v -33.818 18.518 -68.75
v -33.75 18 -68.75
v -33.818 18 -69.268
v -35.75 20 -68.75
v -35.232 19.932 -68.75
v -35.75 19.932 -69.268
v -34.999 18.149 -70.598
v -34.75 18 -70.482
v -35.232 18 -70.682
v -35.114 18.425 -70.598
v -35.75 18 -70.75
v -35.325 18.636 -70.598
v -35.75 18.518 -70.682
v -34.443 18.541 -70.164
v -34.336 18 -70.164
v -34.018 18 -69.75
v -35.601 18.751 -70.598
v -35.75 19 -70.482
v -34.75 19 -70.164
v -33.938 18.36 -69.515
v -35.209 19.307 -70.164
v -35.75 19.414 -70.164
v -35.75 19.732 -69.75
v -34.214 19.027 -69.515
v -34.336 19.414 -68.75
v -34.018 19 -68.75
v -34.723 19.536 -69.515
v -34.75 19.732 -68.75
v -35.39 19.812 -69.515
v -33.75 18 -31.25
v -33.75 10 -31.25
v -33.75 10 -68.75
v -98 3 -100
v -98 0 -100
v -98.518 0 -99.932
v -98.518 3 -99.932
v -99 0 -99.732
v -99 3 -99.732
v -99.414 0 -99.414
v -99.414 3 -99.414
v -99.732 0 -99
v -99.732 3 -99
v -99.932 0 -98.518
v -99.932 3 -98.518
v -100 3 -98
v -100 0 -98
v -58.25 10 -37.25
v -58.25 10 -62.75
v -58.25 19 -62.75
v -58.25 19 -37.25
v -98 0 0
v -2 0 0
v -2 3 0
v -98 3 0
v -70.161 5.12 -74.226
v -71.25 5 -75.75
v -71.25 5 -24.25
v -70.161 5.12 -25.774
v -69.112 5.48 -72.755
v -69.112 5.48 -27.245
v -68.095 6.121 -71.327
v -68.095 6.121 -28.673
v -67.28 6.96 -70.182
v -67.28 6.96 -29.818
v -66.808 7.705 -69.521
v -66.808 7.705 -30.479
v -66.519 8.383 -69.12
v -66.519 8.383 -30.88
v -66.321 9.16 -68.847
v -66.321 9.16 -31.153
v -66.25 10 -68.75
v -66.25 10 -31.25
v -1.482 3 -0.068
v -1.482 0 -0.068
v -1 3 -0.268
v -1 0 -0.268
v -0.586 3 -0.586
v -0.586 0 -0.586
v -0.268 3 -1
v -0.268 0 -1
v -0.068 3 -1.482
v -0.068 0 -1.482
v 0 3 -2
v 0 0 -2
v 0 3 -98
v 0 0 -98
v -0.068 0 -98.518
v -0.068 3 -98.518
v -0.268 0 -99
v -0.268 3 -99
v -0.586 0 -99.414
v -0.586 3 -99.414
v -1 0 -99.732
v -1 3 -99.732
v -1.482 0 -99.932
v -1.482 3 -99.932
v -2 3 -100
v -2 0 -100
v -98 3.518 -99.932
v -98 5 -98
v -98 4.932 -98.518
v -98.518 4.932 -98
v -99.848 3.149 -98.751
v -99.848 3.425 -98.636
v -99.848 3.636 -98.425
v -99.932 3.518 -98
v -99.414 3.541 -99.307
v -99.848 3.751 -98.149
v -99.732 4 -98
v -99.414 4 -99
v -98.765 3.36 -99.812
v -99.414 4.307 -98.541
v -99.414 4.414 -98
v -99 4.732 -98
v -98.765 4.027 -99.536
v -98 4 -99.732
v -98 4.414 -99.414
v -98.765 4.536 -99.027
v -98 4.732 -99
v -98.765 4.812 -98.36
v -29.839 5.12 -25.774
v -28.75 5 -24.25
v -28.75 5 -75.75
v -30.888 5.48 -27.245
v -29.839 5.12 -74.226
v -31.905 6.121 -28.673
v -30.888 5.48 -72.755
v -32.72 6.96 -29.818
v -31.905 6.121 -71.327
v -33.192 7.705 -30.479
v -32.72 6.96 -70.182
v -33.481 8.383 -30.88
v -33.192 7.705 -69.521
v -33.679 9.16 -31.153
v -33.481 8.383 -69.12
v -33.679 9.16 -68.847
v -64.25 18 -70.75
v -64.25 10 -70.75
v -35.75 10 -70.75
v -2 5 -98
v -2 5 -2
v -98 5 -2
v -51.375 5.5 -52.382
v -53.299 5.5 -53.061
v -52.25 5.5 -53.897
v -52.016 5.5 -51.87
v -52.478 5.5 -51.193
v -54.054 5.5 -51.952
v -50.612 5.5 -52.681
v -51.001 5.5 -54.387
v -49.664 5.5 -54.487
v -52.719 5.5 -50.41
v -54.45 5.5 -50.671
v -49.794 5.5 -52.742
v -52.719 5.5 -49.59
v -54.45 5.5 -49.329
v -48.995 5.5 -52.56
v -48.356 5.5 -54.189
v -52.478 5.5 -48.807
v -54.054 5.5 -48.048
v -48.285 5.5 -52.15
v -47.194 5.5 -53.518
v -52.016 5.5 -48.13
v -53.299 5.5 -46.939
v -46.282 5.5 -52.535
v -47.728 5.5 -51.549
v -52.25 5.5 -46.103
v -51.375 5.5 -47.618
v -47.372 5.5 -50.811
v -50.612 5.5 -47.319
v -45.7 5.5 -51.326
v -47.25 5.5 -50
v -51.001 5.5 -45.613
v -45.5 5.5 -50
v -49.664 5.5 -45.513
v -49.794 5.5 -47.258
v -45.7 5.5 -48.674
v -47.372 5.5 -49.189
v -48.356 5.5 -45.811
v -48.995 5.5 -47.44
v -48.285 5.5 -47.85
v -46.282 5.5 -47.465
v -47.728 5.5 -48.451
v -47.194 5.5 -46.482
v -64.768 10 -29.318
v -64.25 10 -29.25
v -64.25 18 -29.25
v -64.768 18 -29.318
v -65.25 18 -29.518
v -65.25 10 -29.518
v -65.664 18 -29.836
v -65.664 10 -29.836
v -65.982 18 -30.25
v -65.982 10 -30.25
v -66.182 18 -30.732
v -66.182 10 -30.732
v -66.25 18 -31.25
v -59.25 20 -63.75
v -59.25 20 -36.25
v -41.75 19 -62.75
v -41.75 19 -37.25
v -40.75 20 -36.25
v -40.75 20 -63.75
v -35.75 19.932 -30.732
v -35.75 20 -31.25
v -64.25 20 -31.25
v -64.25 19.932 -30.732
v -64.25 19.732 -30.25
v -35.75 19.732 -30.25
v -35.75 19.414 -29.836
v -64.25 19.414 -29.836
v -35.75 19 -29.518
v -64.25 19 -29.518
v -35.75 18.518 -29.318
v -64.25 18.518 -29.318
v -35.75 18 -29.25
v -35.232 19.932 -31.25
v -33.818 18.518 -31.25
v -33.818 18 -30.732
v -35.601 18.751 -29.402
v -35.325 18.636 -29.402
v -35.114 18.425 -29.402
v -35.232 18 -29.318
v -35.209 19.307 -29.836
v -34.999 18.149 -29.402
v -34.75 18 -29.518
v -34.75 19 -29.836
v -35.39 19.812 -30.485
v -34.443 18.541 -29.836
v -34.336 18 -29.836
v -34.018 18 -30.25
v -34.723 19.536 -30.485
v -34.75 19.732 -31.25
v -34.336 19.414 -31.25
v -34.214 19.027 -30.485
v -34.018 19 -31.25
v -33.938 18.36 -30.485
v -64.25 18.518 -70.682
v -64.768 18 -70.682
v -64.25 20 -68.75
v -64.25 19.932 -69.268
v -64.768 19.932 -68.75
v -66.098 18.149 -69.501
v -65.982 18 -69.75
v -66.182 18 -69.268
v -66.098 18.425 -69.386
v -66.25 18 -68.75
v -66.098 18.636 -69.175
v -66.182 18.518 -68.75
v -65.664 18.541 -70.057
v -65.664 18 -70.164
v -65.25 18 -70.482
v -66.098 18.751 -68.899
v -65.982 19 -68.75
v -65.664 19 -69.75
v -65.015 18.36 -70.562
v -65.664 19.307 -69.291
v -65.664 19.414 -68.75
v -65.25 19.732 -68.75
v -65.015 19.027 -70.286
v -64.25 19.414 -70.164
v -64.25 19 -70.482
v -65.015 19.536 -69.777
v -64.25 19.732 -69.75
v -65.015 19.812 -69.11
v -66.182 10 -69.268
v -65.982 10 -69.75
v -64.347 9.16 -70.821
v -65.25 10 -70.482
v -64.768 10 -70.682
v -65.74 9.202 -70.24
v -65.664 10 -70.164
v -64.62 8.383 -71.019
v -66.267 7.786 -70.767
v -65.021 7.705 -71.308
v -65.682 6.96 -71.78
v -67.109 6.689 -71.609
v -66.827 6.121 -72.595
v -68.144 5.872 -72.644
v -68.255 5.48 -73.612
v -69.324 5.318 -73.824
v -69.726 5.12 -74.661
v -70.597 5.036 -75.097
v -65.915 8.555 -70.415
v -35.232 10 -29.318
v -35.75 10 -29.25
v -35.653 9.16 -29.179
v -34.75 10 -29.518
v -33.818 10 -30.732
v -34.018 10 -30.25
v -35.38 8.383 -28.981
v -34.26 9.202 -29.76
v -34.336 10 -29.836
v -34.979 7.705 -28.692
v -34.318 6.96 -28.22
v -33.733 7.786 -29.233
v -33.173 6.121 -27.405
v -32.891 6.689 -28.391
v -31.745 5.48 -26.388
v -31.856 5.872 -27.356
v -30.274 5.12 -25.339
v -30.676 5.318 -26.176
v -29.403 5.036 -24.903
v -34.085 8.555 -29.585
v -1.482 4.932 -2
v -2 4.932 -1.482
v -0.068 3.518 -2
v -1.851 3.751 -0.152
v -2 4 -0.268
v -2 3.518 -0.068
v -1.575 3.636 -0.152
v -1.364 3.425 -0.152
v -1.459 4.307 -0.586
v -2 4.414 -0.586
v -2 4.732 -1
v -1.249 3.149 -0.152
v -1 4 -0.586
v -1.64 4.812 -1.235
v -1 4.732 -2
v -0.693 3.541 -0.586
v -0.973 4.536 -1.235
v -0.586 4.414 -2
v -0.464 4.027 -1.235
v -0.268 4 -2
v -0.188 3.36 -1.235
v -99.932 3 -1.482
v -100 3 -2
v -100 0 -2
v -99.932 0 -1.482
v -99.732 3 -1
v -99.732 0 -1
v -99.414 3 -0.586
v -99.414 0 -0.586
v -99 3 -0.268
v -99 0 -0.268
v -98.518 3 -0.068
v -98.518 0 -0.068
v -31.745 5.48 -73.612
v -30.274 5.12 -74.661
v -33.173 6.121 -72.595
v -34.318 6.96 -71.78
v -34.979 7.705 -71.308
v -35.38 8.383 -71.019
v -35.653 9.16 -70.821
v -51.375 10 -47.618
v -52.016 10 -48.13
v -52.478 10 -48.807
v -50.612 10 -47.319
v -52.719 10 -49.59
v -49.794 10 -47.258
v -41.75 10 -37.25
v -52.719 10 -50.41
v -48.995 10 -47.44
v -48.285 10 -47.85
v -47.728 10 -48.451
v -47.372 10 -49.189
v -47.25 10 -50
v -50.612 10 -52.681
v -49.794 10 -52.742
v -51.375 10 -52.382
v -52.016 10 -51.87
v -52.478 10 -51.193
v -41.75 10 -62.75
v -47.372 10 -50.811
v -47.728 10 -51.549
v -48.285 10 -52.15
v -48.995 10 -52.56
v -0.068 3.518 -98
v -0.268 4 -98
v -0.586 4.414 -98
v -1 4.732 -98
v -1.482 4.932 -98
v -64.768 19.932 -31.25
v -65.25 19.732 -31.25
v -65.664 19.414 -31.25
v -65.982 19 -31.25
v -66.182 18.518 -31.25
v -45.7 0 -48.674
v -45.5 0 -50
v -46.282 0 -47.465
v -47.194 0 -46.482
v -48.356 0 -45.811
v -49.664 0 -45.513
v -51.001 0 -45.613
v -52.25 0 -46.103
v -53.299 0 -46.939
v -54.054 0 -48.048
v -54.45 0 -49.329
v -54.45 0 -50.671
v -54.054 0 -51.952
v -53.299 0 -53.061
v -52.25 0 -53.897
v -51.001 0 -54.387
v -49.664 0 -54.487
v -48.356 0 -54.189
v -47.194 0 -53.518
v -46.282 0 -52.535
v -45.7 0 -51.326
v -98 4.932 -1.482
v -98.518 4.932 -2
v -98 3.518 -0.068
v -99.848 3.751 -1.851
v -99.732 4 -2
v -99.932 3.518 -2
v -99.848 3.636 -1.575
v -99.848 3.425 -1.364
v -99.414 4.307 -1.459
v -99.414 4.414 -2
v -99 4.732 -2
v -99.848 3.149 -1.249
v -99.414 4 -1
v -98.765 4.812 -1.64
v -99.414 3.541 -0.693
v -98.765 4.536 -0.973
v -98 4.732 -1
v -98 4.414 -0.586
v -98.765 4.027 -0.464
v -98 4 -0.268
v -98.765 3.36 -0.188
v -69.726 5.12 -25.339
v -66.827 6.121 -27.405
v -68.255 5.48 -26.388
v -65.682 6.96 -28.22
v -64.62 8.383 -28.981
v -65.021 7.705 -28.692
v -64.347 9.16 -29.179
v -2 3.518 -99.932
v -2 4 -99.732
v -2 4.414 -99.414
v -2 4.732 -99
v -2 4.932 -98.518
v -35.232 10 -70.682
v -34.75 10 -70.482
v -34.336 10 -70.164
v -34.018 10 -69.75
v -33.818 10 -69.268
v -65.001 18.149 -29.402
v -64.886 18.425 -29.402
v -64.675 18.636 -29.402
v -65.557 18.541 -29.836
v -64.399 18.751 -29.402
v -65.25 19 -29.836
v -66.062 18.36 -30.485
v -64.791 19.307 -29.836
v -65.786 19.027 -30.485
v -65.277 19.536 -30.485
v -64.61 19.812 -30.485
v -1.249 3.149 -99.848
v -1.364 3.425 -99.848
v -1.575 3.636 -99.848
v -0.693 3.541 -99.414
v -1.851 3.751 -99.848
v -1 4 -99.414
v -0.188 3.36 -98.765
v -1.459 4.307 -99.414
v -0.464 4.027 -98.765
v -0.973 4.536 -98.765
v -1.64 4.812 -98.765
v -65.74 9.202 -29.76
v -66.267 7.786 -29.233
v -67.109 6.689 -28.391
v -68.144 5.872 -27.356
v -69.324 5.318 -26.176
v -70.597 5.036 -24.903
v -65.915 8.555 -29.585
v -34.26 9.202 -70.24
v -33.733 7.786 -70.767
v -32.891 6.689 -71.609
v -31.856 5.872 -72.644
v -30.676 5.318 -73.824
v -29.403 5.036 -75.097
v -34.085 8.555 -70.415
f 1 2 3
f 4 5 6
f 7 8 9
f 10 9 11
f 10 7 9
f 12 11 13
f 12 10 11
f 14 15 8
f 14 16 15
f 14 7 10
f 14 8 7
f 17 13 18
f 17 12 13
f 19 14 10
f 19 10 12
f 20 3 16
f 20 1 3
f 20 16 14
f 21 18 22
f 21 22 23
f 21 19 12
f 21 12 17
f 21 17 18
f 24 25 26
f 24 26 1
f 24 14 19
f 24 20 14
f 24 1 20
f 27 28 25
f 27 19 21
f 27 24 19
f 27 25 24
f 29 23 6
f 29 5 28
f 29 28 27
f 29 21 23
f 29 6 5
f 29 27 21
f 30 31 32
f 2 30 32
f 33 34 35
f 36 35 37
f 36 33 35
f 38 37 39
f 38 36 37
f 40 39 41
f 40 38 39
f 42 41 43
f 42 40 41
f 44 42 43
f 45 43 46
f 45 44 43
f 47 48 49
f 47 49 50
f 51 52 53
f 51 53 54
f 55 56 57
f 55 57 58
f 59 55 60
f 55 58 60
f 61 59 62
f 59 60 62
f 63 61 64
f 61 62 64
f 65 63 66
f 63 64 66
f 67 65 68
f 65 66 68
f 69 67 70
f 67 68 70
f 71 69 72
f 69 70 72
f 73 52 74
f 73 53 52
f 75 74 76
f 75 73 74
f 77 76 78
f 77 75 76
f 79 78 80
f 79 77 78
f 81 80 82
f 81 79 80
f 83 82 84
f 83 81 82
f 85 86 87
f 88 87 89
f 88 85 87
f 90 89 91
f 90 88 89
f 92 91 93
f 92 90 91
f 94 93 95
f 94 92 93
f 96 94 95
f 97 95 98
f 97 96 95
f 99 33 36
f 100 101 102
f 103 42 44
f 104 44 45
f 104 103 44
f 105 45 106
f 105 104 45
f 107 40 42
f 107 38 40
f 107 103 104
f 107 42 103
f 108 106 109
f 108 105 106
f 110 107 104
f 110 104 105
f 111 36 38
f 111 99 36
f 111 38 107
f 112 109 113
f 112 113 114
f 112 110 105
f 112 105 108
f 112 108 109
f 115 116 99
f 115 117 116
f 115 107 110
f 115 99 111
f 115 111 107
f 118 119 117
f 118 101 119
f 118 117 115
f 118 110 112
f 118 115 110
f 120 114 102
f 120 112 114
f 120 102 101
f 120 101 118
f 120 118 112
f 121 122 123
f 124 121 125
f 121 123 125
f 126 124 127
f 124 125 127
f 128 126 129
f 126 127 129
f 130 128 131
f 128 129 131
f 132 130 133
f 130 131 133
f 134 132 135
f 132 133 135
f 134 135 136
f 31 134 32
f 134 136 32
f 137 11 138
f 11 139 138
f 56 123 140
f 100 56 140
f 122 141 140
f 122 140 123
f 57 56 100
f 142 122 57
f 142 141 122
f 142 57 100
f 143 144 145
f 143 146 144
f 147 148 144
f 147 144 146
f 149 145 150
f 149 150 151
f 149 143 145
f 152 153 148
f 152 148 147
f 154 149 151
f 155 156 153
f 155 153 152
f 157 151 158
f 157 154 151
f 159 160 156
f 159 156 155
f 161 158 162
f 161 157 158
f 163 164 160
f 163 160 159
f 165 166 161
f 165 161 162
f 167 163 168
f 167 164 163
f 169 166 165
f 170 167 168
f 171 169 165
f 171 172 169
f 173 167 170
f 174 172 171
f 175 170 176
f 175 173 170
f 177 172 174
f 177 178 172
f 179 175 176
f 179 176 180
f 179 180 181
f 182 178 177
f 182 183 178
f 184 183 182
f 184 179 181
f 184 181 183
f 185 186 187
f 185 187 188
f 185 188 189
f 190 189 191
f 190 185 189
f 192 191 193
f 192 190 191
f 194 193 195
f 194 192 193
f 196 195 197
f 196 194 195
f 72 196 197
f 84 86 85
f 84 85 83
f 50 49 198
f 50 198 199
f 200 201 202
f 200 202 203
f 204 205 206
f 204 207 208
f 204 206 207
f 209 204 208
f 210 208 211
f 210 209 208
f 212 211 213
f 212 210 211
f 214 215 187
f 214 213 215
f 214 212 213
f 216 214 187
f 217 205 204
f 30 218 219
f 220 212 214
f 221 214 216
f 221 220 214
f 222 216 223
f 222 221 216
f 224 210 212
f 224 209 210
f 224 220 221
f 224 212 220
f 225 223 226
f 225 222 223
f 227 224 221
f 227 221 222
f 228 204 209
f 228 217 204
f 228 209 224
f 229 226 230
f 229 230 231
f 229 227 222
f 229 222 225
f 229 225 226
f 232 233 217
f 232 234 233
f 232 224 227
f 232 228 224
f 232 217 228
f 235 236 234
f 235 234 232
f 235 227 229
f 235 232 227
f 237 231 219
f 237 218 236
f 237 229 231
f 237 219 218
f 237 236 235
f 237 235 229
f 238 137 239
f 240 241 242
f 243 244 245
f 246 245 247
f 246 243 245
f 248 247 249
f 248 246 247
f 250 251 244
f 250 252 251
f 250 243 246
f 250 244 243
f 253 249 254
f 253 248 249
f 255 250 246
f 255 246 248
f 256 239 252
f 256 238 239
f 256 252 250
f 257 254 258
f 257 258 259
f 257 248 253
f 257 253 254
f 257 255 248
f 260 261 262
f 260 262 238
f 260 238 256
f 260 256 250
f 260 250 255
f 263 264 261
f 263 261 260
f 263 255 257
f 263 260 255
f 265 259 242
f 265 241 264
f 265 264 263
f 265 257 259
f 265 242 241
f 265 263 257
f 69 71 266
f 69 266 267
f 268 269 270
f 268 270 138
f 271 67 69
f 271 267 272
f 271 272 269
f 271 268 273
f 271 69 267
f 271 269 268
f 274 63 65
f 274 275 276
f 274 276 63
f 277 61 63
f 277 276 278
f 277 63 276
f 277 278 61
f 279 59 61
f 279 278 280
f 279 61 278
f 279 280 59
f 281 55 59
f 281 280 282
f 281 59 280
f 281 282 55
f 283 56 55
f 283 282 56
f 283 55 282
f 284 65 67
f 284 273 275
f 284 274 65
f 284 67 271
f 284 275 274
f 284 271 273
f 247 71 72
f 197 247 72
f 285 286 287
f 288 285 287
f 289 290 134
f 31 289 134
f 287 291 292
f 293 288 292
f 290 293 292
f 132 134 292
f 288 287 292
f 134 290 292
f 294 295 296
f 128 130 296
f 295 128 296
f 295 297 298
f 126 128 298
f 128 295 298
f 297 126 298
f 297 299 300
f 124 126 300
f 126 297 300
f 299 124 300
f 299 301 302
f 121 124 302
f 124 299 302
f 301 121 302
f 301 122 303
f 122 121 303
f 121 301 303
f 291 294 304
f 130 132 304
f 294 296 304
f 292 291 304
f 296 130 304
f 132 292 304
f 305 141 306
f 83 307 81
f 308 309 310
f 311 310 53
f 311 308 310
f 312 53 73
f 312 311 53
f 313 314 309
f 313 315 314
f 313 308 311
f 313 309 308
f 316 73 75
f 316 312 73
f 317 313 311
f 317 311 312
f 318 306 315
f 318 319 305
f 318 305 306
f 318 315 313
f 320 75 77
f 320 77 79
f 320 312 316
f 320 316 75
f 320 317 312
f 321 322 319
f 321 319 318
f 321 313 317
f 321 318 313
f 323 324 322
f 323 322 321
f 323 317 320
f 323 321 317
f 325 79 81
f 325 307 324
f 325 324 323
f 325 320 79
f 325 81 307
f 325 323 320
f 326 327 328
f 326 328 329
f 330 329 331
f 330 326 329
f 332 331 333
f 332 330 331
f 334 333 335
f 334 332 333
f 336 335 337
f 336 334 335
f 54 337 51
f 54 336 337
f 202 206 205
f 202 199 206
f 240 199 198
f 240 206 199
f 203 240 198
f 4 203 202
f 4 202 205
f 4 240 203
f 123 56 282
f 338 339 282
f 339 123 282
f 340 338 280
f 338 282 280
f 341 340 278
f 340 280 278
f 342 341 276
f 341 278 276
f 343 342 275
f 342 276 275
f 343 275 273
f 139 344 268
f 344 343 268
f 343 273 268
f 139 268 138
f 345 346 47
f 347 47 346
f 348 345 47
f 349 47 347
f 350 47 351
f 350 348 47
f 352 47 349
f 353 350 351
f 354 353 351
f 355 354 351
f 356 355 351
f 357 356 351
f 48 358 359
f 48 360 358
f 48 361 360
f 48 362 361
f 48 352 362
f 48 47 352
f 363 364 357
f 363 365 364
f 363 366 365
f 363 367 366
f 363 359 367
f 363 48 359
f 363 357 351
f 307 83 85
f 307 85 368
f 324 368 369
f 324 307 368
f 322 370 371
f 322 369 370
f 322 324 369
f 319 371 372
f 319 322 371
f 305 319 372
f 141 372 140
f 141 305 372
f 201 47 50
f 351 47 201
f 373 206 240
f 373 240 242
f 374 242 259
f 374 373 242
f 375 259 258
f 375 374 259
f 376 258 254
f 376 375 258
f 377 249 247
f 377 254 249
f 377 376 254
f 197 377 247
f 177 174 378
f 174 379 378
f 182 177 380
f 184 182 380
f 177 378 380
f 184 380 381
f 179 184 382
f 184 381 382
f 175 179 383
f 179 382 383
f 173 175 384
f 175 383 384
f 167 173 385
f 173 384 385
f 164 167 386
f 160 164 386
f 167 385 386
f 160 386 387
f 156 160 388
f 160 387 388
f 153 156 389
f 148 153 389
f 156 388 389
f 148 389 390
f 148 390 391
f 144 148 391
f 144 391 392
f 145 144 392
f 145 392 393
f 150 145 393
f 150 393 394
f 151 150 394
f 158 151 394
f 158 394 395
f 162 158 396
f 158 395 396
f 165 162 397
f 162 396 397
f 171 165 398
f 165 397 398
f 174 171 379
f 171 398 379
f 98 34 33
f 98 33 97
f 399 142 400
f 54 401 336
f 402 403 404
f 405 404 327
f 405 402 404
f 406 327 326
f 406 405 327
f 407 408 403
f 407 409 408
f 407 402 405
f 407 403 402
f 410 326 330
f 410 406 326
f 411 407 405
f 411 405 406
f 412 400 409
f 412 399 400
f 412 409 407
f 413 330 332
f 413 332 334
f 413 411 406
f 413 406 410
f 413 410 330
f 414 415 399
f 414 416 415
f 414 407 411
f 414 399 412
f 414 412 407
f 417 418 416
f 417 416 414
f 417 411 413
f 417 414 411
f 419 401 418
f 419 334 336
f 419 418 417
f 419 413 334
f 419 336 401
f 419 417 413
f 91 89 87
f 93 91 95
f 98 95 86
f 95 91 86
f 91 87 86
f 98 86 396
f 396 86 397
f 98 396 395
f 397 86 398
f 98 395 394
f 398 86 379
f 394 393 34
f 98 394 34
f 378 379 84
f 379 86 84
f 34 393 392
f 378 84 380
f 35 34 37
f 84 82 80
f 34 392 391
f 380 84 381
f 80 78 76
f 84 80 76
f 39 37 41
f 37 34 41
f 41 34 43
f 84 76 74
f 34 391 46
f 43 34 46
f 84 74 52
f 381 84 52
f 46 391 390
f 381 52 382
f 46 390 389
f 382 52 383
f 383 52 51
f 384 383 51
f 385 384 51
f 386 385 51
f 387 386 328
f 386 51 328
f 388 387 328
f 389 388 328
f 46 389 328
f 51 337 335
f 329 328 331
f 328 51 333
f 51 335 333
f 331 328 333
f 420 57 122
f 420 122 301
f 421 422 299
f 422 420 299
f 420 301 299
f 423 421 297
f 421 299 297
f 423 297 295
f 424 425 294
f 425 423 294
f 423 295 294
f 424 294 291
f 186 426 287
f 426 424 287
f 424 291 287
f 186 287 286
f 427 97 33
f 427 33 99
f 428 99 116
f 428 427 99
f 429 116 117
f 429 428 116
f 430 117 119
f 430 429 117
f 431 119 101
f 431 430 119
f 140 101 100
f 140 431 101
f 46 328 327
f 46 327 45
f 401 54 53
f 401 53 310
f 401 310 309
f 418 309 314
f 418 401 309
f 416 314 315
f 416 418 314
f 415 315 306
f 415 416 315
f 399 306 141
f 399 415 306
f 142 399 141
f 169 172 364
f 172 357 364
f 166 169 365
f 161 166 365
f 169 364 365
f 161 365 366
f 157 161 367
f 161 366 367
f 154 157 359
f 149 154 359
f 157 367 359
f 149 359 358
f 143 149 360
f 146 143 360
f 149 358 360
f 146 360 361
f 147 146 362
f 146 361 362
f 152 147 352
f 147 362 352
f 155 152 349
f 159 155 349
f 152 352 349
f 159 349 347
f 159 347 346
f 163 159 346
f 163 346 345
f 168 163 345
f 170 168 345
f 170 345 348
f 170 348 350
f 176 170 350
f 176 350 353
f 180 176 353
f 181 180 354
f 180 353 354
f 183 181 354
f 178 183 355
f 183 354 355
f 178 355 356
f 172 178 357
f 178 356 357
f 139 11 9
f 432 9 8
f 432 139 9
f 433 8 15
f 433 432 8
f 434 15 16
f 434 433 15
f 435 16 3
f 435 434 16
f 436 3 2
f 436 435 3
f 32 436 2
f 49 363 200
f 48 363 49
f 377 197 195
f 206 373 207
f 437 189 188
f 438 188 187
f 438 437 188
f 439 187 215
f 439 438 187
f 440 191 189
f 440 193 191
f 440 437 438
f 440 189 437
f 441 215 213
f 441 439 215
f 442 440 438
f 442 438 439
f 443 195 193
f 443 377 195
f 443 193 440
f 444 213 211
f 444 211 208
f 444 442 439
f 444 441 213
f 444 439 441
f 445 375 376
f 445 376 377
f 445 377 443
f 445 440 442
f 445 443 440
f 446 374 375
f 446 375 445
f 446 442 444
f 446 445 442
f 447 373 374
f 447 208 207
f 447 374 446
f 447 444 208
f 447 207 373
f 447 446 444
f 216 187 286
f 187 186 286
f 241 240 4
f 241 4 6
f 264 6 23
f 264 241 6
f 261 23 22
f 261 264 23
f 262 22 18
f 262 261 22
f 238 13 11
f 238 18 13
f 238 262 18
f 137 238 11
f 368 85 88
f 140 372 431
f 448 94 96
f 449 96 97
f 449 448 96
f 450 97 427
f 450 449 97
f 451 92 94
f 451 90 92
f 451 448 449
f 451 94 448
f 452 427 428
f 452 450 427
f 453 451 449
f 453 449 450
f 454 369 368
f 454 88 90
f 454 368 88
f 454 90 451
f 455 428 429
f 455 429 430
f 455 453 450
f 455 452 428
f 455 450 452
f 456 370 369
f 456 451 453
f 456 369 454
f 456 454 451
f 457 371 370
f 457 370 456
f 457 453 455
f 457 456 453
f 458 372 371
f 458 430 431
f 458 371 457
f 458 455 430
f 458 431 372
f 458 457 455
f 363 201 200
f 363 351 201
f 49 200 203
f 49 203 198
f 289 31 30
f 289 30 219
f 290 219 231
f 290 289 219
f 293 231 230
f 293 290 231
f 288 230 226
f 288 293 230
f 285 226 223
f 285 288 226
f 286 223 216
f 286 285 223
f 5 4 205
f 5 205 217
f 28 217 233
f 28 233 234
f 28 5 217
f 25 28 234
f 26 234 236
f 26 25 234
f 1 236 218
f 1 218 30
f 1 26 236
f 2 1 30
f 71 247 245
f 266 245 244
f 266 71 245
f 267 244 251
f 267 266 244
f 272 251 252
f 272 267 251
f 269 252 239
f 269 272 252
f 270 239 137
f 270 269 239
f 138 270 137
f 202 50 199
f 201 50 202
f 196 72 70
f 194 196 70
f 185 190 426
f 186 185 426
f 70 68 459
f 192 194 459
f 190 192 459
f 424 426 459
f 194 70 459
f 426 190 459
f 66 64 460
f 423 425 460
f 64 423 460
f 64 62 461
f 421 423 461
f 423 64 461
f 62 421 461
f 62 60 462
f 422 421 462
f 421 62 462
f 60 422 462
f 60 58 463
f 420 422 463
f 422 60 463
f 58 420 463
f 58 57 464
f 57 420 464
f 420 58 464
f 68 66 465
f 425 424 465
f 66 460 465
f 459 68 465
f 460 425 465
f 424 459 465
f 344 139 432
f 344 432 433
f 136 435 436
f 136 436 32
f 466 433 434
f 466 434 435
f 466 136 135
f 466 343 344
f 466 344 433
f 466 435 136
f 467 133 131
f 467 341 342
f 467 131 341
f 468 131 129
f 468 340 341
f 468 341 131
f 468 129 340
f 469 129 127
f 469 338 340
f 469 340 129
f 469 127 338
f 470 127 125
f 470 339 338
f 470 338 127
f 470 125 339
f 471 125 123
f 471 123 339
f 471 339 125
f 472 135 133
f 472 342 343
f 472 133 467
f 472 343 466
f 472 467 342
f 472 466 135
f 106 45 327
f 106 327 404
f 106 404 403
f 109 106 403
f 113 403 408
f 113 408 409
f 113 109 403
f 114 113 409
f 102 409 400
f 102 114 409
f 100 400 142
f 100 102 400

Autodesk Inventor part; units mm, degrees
ref_plane "YZ Plane" through (0, 0, 0) normal (1, 0, 0) x (0, 1, 0)
ref_plane "XZ Plane" through (0, 0, 0) normal (0, 1, 0) x (-1, 0, 0)
ref_plane "XY Plane" through (0, 0, 0) normal (0, 0, 1) x (1, 0, 0)
sketch "Sketch1" plane through (0, 0, 0) normal (0, 1, 0) x (-1, 0, 0)
  line L0 (0, 0) -> (100, 0)
  line L1 (100, 0) -> (100, -100)
  line L2 (100, -100) -> (0, -100)
  line L3 (0, -100) -> (0, 0)
  dimension "d0" = 100
  dimension "d1" = 100
extrude "Extrusion1" add sketch "Sketch1" along normal blind 5
sketch "Sketch2" plane through (0, 5, 0) normal (0, 1, 0) x (1, 0, 0)
  line L0 (0, 100) -> (-100, 100) projected
  line L1 (-100, 100) -> (-100, 0) projected
  line L2 (-100, 0) -> (0, 0) projected
  line L3 (0, 0) -> (0, 100) projected
  line L4 (-58.25, 37.25) -> (-41.75, 37.25)
  line L5 (-41.75, 37.25) -> (-41.75, 62.75)
  line L6 (-41.75, 62.75) -> (-58.25, 62.75)
  line L7 (-58.25, 62.75) -> (-58.25, 37.25)
  line L8 (-66.25, 29.25) -> (-33.75, 29.25)
  line L9 (-33.75, 29.25) -> (-33.75, 70.75)
  line L10 (-33.75, 70.75) -> (-66.25, 70.75)
  line L11 (-66.25, 70.75) -> (-66.25, 29.25)
  line L12 (-100, 100) -> (-100, 0) construction
  line L13 (0, 100) -> (-100, 100) construction
  line L14 (-100, 0) -> (0, 100) construction
  line L15 (0, 100) -> (-100, 100) construction
  line L16 (-100, 100) -> (0, 0) construction
  line L17 (-66.25, 29.25) -> (-33.75, 70.75) construction
  line L18 (-66.25, 70.75) -> (-33.75, 29.25) construction
  point P0 (-50, 50)
  dimension "d7" = 16.5
  dimension "d8" = 25.5
  dimension "d10" = 8
extrude "Extrusion2" add sketch "Sketch2" along normal blind 15 contours L11 L10 L9 L8
sketch "Sketch3" plane through (0, 5, 0) normal (0, 1, 0) x (1, 0, 0)
  line L0 (-58.25, 37.25) -> (-41.75, 37.25) projected
  line L1 (-41.75, 37.25) -> (-41.75, 62.75) projected
  line L2 (-41.75, 62.75) -> (-58.25, 62.75) projected
  line L3 (-58.25, 62.75) -> (-58.25, 37.25) projected
  point P0 (0, 0)
extrude "Extrusion3" add sketch "Sketch3" along normal blind 5
sketch "Sketch4" plane through (0, 10, 0) normal (0, 1, 0) x (1, 0, 0)
  line L0 (-41.75, 62.75) -> (-41.75, 37.25) projected
  line L1 (-58.25, 62.75) -> (-41.75, 62.75) projected
  line L2 (-58.25, 37.25) -> (-58.25, 62.75) projected
  line L3 (-41.75, 37.25) -> (-58.25, 37.25) projected
  line L4 (-58.25, 37.25) -> (-41.75, 62.75) construction
  line L5 (-58.25, 62.75) -> (-41.75, 37.25) construction
  circle A0 centre (-50, 50) radius 2.75
  point P0 (0, 0)
  dimension "d15" = 5.5
extrude "Extrusion4" cut sketch "Sketch4" against normal through all contours A0
sketch "Sketch5" plane through (0, 0, 0) normal (0, -1, 0) x (1, 0, 0)
  circle A0 centre (-50, -50) radius 2.75 projected
  line L0 (0, -100) -> (-100, -100) projected
  line L1 (0, 0) -> (0, -100) projected
  line L2 (-100, 0) -> (0, 0) projected
  line L3 (-100, -100) -> (-100, 0) projected
  circle A1 centre (-50, -50) radius 4.5
  dimension "d18" = 9
extrude "Extrusion5" cut sketch "Sketch5" against normal blind 5.5 contours A0 | A1
fillet "Fillet1" radius 5 4 edges at (-66.25, 5, -50) (-50, 5, -70.75) (-50, 5, -29.25) (-33.75, 5, -50)
fillet "Fillet2" radius 2 20 edges at (-33.75, 20, -50) (-50, 20, -70.75) (-66.25, 20, -50) (-50, 20, -29.25) (-67.7145, 6.4645, -27.7855) (-66.25, 15, -29.25) (-67.7145, 6.4645, -72.2145) (-66.25, 15, -70.75) (-32.2855, 6.4645, -27.7855) (-33.75, 15, -29.25) (-32.2855, 6.4645, -72.2145) (-33.75, 15, -70.75) (0, 5, -50) (-50, 5, 0) (0, 2.5, 0) (-50, 5, -100) (0, 2.5, -100) (-100, 2.5, -100) (-100, 5, -50) (-100, 2.5, 0)
chamfer "Chamfer1" distance 1 angle 45 4 edges at (-58.25, 20, -50) (-50, 20, -62.75) (-50, 20, -37.25) (-41.75, 20, -50)
properties part number "base_frame"
